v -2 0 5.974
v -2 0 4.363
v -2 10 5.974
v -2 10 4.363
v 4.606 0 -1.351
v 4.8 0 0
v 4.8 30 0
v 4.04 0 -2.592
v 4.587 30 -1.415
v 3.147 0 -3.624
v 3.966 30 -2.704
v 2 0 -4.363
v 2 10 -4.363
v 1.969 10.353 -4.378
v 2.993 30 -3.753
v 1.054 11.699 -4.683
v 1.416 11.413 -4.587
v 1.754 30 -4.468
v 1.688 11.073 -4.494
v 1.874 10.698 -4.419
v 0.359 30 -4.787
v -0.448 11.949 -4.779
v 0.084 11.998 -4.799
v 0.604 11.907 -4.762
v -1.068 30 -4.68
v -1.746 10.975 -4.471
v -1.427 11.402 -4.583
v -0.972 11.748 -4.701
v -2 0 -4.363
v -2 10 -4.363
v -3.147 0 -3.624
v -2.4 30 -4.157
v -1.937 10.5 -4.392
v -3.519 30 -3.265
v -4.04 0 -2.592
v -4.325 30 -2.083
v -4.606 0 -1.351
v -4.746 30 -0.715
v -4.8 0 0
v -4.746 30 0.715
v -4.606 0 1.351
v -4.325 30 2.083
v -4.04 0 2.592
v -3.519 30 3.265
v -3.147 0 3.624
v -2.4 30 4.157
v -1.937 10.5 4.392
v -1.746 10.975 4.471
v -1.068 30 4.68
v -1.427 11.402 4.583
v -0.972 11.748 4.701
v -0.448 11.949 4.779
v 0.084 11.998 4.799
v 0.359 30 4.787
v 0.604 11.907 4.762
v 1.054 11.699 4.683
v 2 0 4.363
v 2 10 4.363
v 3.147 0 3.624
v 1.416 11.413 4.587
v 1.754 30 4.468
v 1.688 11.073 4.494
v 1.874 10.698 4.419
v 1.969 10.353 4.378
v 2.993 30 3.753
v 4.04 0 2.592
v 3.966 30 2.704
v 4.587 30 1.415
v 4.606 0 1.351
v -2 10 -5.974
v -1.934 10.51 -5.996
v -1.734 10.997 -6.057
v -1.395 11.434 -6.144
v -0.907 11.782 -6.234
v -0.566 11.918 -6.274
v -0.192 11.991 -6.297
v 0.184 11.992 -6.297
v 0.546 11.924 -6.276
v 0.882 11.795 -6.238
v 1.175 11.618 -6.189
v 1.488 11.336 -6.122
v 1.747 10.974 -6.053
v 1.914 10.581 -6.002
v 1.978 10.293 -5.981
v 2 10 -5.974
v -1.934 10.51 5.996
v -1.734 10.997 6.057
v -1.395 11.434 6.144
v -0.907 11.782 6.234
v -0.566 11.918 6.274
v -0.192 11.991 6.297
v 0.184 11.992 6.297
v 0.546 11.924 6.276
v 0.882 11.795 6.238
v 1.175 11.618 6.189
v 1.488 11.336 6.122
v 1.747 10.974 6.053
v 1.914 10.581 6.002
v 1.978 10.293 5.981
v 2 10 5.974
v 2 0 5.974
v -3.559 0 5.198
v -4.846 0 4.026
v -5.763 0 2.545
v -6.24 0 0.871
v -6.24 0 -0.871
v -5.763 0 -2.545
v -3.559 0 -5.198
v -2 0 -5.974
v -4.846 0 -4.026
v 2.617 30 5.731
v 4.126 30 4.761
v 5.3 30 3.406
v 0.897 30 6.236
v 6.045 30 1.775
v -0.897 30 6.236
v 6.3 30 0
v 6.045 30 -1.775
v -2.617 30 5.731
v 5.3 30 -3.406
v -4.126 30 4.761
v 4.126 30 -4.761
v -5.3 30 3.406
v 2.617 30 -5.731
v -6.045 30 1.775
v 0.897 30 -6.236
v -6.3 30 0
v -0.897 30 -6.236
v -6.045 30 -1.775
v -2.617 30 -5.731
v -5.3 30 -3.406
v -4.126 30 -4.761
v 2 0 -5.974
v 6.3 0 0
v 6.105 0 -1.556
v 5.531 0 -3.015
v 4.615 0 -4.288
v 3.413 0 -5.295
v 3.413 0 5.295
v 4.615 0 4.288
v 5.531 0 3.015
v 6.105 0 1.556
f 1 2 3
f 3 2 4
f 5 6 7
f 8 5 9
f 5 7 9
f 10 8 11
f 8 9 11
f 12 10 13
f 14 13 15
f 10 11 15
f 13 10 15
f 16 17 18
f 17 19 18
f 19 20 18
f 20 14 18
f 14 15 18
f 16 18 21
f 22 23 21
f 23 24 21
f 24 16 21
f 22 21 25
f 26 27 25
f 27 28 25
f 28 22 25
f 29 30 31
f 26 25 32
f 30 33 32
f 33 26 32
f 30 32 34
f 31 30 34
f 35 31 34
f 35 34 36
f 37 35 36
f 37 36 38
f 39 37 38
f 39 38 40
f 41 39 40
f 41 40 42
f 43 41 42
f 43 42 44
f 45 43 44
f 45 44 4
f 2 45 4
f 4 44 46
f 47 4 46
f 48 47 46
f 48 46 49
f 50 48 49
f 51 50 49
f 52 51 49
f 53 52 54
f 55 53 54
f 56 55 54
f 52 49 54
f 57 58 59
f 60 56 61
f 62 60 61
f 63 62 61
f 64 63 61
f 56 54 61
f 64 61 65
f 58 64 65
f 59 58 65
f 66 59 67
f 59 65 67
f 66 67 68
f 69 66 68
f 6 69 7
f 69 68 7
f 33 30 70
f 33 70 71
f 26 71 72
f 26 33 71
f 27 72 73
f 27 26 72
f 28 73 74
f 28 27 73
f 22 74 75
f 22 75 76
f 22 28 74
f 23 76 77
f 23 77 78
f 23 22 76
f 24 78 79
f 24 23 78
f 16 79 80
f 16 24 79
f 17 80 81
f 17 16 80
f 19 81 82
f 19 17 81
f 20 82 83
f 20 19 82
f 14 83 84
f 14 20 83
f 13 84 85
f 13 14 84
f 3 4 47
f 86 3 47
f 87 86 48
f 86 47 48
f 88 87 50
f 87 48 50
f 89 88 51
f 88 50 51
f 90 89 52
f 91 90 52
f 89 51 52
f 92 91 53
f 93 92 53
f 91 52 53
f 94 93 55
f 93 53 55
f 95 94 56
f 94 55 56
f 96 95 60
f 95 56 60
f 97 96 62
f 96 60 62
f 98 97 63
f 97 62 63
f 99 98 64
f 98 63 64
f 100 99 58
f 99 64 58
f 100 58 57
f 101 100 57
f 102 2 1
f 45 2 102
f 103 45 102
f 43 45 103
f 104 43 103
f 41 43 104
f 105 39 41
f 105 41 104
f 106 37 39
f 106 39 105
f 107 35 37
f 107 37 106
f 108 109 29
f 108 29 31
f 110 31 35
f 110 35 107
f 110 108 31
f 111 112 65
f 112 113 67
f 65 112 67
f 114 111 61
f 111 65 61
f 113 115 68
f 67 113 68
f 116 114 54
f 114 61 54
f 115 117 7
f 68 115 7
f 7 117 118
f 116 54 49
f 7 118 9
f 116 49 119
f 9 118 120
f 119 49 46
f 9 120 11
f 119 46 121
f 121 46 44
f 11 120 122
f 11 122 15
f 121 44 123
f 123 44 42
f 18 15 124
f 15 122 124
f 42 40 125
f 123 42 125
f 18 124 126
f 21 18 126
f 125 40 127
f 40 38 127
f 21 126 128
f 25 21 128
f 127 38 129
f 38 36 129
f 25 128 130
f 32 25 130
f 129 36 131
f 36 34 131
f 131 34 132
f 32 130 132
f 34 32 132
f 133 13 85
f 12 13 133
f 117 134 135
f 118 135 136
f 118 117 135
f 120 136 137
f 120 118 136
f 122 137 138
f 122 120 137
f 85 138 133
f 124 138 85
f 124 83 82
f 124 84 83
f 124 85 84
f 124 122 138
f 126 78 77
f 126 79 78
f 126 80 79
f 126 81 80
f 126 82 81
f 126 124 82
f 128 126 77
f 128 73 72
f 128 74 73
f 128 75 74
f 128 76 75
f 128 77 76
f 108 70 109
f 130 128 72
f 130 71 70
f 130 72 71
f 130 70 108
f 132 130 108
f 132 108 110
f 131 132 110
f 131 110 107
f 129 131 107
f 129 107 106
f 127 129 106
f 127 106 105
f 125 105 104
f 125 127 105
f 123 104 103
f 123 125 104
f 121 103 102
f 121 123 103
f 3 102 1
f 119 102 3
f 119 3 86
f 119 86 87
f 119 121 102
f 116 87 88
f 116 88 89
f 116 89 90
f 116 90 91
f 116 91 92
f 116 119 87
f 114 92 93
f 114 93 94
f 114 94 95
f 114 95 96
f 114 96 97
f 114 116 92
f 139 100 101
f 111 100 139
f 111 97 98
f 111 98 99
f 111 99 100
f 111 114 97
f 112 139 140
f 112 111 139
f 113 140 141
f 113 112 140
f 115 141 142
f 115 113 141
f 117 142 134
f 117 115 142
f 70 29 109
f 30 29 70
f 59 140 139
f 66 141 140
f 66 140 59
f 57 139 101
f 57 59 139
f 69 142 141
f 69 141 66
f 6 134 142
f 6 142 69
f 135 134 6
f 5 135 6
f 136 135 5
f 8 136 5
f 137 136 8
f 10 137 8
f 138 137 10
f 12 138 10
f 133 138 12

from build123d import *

# Parameters (mm, degrees)
ESQUISSE1_W                  = 1.5
ESQUISSE1_H                  = 30
ENL_V_MAT_EXTRU_1_DEPTH      = 7.3
ENL_V_MAT_EXTRU_1_DEPTH_BACK = 7.3


with BuildPart() as part:
    # Esquisse1 → Révolution1 (revolve)
    with BuildSketch(Plane.XY):
        with Locations((5.55, 15)):
            Rectangle(ESQUISSE1_W, ESQUISSE1_H)
    revolve(axis=Axis((0, 0, 0), (0, 1, 0)))

    # Esquisse2 → Enlèv. mat.-Extru.1 (cut, two sides)
    with BuildSketch(Plane.XY) as enl_v_mat_extru_1_sk:
        with BuildLine():
            Line((-2, -10), (-2, 10))
            ThreePointArc((-2, 10), (0, 12), (2, 10))
            Line((2, 10), (2, -10))
            ThreePointArc((2, -10), (0, -12), (-2, -10))
        make_face()
    extrude(amount=ENL_V_MAT_EXTRU_1_DEPTH, mode=Mode.SUBTRACT)
    extrude(enl_v_mat_extru_1_sk.sketch, amount=-ENL_V_MAT_EXTRU_1_DEPTH_BACK, mode=Mode.SUBTRACT)


solid = part.part
